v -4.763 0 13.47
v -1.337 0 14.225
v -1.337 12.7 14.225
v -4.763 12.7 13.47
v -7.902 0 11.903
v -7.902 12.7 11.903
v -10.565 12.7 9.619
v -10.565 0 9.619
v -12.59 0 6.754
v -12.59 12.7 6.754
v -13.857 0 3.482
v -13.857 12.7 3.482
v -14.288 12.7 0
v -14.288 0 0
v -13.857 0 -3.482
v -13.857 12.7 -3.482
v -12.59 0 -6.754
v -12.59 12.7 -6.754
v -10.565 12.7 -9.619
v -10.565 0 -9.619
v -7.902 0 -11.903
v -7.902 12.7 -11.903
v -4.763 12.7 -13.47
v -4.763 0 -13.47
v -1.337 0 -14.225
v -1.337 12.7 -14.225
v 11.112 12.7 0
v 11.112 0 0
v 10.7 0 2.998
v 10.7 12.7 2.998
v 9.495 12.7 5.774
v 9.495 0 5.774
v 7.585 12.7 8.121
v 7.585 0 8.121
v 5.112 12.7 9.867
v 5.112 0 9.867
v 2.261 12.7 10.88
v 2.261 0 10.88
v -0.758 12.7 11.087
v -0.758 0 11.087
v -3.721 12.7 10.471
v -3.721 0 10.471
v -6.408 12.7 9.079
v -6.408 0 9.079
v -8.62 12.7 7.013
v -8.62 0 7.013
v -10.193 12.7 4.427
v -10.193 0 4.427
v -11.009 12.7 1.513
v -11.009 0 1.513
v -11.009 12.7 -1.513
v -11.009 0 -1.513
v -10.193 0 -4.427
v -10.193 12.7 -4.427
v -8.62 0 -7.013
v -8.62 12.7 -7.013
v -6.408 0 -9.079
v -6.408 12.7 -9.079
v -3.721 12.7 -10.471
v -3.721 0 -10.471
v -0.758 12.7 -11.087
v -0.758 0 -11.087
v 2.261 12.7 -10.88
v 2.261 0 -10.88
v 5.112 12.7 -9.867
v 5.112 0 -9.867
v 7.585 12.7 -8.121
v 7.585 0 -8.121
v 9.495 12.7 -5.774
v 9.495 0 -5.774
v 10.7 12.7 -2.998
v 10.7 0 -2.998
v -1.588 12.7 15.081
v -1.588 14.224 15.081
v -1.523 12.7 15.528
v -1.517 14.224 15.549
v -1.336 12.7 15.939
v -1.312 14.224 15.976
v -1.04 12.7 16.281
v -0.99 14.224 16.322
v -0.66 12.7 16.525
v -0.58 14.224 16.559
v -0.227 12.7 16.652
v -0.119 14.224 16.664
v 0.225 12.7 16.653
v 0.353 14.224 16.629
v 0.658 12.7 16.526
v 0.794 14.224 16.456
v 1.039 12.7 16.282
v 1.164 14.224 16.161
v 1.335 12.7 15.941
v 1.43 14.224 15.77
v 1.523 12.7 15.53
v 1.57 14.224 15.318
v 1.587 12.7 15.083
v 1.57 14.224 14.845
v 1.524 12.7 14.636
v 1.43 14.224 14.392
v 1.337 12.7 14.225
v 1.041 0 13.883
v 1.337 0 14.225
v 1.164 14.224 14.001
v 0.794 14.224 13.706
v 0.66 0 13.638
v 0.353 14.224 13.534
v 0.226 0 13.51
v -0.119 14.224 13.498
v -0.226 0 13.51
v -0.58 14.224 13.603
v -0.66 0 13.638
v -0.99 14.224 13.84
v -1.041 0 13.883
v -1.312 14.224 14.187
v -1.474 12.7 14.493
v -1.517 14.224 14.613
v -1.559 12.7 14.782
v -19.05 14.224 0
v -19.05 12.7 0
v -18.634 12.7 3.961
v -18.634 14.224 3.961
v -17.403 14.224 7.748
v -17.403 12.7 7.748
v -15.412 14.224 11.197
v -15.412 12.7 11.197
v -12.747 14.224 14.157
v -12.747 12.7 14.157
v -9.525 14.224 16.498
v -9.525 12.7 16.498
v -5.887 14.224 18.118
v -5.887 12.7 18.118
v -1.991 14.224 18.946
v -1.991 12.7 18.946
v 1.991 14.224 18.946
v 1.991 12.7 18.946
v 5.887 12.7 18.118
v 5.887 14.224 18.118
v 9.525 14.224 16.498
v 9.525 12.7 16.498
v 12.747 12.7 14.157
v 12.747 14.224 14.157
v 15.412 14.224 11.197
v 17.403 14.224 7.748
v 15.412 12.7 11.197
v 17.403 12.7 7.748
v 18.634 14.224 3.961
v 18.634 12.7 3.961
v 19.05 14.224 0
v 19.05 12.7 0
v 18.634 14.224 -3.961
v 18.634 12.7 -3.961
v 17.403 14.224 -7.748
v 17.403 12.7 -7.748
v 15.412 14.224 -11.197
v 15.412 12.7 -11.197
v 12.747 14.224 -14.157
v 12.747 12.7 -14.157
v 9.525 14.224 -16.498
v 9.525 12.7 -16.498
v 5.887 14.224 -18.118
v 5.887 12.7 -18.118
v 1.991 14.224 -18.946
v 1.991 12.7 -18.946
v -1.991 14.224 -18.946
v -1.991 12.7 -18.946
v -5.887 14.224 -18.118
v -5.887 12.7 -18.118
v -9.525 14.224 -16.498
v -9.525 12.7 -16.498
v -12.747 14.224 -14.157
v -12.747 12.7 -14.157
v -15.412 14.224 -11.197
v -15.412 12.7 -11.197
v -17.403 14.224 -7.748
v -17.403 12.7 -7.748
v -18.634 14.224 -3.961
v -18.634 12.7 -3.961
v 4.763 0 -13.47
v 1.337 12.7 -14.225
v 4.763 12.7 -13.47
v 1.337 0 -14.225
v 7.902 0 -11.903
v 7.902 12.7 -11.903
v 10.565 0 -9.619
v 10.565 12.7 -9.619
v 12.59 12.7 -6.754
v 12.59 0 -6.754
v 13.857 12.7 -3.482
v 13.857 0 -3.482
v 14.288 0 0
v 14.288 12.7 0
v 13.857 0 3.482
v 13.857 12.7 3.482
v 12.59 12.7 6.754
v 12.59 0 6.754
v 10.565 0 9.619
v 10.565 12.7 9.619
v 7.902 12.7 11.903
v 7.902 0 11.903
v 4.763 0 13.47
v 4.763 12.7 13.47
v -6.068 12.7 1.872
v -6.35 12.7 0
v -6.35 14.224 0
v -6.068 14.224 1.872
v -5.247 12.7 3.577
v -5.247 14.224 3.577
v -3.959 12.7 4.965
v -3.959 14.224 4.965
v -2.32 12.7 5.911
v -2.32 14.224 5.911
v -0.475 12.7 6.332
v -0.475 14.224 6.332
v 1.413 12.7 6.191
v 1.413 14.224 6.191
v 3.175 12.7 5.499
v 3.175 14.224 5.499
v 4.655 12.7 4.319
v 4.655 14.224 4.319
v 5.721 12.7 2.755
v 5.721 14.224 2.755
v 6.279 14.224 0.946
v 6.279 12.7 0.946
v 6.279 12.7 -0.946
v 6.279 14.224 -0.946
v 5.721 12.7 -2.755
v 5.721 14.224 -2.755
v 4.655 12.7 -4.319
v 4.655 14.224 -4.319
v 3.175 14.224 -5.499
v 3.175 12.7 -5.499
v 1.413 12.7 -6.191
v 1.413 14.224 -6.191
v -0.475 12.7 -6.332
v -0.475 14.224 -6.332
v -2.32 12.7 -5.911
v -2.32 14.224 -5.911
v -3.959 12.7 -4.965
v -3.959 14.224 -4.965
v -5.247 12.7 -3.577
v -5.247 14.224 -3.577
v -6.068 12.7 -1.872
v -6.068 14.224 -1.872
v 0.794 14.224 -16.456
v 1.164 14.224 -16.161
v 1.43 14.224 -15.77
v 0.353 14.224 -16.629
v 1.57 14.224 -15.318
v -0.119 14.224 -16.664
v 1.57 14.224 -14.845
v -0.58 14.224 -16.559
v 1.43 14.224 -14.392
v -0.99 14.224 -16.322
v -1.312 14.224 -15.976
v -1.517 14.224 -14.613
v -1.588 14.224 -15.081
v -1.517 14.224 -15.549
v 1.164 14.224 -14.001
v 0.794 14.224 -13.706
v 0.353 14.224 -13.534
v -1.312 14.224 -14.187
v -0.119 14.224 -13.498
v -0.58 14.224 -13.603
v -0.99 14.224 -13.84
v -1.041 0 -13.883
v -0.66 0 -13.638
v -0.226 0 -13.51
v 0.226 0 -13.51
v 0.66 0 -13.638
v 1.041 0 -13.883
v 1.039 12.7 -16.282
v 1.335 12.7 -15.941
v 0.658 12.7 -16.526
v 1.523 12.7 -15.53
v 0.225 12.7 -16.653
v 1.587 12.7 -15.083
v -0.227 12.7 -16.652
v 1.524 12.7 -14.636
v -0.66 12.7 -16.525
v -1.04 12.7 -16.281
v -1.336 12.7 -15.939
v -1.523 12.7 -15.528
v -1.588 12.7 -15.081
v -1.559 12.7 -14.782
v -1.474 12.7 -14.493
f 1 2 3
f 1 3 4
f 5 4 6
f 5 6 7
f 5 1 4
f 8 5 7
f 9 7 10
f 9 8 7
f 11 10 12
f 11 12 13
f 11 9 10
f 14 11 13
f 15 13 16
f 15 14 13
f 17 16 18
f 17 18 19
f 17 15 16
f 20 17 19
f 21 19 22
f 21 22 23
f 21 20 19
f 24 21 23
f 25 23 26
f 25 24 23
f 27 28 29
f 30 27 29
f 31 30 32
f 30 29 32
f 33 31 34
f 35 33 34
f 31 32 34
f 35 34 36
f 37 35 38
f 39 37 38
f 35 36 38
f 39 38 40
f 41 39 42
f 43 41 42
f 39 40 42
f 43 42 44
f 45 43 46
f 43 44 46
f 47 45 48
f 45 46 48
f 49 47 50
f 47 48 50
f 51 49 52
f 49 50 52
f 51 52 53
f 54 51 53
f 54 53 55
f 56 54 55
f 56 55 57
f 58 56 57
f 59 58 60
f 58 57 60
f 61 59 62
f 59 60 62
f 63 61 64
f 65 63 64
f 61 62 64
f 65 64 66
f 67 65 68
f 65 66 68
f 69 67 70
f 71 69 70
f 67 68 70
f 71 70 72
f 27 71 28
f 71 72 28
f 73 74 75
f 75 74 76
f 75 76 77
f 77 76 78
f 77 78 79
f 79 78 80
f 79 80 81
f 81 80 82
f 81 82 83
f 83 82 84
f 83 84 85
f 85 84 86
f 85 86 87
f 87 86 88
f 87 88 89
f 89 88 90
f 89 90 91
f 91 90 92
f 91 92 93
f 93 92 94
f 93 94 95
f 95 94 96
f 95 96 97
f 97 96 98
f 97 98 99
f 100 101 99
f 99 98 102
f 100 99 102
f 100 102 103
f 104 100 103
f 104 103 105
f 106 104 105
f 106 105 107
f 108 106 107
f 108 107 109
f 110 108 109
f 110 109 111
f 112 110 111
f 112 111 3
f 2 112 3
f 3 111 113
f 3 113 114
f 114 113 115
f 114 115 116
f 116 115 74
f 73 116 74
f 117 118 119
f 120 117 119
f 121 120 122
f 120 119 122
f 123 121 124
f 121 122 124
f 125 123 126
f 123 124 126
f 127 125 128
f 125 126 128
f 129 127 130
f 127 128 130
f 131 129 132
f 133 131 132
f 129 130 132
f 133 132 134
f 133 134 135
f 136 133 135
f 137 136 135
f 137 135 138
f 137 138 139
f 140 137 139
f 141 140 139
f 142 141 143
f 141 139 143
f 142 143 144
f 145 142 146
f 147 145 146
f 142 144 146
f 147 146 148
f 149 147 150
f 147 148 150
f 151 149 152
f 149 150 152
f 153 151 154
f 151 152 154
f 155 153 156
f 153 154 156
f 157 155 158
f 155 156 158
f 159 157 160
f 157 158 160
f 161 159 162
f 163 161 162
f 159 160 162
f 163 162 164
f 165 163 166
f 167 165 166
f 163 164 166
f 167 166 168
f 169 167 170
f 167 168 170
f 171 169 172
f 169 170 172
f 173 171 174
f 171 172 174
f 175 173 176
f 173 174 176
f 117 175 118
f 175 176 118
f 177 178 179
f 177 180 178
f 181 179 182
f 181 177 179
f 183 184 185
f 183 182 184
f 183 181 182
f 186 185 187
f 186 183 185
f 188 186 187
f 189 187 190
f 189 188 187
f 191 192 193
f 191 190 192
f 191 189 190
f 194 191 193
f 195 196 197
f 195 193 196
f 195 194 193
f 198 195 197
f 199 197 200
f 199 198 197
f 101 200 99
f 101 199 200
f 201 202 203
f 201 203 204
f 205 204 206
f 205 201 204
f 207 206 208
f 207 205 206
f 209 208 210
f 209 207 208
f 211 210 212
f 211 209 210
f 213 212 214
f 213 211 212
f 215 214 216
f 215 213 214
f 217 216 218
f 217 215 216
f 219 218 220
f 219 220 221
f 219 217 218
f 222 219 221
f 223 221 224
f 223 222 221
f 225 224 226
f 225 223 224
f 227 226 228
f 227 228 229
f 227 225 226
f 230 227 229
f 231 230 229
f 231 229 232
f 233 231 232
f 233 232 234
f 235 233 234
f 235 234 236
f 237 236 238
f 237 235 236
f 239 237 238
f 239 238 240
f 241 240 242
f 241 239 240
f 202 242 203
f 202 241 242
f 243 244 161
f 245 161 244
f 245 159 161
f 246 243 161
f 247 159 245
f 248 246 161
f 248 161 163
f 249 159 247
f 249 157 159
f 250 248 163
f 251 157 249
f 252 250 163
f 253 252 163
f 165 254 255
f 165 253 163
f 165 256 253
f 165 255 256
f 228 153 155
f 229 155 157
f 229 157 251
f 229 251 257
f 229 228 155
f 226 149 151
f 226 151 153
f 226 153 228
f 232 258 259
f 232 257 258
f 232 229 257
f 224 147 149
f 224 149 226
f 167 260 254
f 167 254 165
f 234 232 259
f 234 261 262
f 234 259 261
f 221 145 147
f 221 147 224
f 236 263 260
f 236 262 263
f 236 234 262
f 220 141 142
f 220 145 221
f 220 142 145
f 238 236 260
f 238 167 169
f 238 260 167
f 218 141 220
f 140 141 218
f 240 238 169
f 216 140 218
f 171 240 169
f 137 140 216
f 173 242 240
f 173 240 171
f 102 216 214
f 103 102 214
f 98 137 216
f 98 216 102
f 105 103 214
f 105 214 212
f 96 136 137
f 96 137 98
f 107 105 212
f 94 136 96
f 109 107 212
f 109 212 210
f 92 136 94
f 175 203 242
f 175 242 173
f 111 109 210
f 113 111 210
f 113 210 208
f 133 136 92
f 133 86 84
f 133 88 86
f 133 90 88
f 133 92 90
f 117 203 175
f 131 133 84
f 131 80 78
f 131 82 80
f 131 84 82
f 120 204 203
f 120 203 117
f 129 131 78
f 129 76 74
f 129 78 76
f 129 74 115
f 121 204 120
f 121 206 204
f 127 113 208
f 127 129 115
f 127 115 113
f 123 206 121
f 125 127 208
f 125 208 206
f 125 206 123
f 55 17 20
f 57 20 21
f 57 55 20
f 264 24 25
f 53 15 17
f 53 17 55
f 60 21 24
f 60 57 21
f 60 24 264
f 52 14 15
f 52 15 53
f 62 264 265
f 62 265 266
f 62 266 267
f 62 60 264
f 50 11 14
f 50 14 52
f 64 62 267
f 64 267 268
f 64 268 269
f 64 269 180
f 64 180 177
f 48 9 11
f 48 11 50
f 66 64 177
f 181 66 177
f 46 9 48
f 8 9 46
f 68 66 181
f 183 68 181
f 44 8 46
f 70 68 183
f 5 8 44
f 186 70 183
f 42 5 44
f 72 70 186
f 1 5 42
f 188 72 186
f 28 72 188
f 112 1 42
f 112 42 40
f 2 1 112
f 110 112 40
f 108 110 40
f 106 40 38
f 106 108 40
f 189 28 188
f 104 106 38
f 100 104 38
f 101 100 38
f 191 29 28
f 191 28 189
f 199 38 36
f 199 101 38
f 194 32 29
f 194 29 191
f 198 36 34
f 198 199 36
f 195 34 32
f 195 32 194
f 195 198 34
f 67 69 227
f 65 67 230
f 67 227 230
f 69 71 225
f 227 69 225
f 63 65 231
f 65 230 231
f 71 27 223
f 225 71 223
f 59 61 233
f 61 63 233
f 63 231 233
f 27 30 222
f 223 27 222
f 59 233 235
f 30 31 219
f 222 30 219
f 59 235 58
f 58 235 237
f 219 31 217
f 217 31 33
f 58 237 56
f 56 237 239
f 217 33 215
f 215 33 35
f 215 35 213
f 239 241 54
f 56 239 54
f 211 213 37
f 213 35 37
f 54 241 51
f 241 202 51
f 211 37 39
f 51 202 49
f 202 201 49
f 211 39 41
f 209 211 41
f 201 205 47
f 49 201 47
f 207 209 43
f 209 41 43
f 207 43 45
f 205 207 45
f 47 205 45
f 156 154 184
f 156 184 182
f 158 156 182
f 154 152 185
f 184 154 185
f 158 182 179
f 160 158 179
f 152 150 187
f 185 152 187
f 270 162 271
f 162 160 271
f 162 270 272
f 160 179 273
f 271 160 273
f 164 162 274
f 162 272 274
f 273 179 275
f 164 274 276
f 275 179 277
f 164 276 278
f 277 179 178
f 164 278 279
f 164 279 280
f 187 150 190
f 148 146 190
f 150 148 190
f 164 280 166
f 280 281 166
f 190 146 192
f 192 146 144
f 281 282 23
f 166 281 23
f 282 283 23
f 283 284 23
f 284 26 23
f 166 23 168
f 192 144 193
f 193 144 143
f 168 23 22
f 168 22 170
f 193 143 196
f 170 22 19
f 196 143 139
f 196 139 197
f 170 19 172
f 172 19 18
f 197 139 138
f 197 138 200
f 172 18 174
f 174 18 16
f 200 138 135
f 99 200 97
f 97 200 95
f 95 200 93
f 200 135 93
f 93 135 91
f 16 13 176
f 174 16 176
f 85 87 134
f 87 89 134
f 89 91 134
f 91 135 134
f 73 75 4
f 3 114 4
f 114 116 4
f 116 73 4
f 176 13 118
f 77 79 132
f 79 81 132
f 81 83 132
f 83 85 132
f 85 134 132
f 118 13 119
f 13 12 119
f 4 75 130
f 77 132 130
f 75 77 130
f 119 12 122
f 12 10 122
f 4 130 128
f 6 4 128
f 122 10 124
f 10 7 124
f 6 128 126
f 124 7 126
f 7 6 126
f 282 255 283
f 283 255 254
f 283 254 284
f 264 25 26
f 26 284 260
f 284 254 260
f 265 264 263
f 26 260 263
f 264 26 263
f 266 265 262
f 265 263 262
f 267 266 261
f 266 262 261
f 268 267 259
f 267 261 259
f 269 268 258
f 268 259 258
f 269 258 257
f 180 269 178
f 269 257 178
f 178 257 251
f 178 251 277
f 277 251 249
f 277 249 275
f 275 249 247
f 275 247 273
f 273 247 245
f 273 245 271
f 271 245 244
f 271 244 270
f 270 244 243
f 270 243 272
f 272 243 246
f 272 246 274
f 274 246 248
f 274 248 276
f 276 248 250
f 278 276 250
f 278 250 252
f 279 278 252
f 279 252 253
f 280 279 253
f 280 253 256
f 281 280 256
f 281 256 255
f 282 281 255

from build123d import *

# Parameters (mm, degrees)
F0_R     = 14.2875
F0_R_2   = 11.1125
F1_DEPTH = 12.7
F2_R     = 19.05
F2_R_2   = 1.5875
F2_R_3   = 6.35
F3_DEPTH = 1.524
F4_R     = 1.5875
F5_DEPTH = 25.4


with BuildPart() as f1:
    # F0 (on Front) → F1 (new body)
    with BuildSketch(Plane.XZ):
        Circle(F0_R)
        Circle(F0_R_2, mode=Mode.SUBTRACT)
    extrude(amount=-F1_DEPTH)

    # F2 (on face) → F3 (join)
    with BuildSketch(Plane(origin=(0, 12.7, 0), x_dir=(-1, 0, 0), z_dir=(0, 1, 0))):
        Circle(F2_R)
        with Locations((0, -15.08125)):
            Circle(F2_R_2, mode=Mode.SUBTRACT)
        Circle(F2_R_3, mode=Mode.SUBTRACT)
        with Locations((0, 15.08125)):
            Circle(F2_R_2, mode=Mode.SUBTRACT)
        with BuildLine():
            ThreePointArc((1.336679, 14.224836), (0, 14.2875), (-1.336679, 14.224836))
            ThreePointArc((-1.336679, 14.224836), (0, 13.49375), (1.336679, 14.224836))
        make_face()
        with BuildLine():
            ThreePointArc((1.336679, -14.224836), (0, -14.2875), (-1.336679, -14.224836))
            ThreePointArc((-1.336679, -14.224836), (-0.446194, -16.604755), (1.5875, -15.08125))
            ThreePointArc((1.5875, -15.08125), (1.523505, -14.635056), (1.336679, -14.224836))
        make_face()
        with BuildLine():
            ThreePointArc((1.336679, -14.224836), (0, -13.49375), (-1.336679, -14.224836))
            ThreePointArc((-1.336679, -14.224836), (0, -14.2875), (1.336679, -14.224836))
        make_face()
        with BuildLine():
            ThreePointArc((1.336679, 14.224836), (1.523505, 14.635056), (1.5875, 15.08125))
            ThreePointArc((1.5875, 15.08125), (-0.446194, 16.604755), (-1.336679, 14.224836))
            ThreePointArc((-1.336679, 14.224836), (0, 14.2875), (1.336679, 14.224836))
        make_face()
    extrude(amount=F3_DEPTH)

    # F4 (on face) → F5 (cut)
    with BuildSketch(Plane(origin=(0, 14.224, 0), x_dir=(-1, 0, 0), z_dir=(0, 1, 0))):
        with Locations((0, 15.08125)):
            Circle(F4_R)
        with Locations((0, -15.08125)):
            Circle(F4_R)
    extrude(amount=-F5_DEPTH, mode=Mode.SUBTRACT)


solid = f1.part
